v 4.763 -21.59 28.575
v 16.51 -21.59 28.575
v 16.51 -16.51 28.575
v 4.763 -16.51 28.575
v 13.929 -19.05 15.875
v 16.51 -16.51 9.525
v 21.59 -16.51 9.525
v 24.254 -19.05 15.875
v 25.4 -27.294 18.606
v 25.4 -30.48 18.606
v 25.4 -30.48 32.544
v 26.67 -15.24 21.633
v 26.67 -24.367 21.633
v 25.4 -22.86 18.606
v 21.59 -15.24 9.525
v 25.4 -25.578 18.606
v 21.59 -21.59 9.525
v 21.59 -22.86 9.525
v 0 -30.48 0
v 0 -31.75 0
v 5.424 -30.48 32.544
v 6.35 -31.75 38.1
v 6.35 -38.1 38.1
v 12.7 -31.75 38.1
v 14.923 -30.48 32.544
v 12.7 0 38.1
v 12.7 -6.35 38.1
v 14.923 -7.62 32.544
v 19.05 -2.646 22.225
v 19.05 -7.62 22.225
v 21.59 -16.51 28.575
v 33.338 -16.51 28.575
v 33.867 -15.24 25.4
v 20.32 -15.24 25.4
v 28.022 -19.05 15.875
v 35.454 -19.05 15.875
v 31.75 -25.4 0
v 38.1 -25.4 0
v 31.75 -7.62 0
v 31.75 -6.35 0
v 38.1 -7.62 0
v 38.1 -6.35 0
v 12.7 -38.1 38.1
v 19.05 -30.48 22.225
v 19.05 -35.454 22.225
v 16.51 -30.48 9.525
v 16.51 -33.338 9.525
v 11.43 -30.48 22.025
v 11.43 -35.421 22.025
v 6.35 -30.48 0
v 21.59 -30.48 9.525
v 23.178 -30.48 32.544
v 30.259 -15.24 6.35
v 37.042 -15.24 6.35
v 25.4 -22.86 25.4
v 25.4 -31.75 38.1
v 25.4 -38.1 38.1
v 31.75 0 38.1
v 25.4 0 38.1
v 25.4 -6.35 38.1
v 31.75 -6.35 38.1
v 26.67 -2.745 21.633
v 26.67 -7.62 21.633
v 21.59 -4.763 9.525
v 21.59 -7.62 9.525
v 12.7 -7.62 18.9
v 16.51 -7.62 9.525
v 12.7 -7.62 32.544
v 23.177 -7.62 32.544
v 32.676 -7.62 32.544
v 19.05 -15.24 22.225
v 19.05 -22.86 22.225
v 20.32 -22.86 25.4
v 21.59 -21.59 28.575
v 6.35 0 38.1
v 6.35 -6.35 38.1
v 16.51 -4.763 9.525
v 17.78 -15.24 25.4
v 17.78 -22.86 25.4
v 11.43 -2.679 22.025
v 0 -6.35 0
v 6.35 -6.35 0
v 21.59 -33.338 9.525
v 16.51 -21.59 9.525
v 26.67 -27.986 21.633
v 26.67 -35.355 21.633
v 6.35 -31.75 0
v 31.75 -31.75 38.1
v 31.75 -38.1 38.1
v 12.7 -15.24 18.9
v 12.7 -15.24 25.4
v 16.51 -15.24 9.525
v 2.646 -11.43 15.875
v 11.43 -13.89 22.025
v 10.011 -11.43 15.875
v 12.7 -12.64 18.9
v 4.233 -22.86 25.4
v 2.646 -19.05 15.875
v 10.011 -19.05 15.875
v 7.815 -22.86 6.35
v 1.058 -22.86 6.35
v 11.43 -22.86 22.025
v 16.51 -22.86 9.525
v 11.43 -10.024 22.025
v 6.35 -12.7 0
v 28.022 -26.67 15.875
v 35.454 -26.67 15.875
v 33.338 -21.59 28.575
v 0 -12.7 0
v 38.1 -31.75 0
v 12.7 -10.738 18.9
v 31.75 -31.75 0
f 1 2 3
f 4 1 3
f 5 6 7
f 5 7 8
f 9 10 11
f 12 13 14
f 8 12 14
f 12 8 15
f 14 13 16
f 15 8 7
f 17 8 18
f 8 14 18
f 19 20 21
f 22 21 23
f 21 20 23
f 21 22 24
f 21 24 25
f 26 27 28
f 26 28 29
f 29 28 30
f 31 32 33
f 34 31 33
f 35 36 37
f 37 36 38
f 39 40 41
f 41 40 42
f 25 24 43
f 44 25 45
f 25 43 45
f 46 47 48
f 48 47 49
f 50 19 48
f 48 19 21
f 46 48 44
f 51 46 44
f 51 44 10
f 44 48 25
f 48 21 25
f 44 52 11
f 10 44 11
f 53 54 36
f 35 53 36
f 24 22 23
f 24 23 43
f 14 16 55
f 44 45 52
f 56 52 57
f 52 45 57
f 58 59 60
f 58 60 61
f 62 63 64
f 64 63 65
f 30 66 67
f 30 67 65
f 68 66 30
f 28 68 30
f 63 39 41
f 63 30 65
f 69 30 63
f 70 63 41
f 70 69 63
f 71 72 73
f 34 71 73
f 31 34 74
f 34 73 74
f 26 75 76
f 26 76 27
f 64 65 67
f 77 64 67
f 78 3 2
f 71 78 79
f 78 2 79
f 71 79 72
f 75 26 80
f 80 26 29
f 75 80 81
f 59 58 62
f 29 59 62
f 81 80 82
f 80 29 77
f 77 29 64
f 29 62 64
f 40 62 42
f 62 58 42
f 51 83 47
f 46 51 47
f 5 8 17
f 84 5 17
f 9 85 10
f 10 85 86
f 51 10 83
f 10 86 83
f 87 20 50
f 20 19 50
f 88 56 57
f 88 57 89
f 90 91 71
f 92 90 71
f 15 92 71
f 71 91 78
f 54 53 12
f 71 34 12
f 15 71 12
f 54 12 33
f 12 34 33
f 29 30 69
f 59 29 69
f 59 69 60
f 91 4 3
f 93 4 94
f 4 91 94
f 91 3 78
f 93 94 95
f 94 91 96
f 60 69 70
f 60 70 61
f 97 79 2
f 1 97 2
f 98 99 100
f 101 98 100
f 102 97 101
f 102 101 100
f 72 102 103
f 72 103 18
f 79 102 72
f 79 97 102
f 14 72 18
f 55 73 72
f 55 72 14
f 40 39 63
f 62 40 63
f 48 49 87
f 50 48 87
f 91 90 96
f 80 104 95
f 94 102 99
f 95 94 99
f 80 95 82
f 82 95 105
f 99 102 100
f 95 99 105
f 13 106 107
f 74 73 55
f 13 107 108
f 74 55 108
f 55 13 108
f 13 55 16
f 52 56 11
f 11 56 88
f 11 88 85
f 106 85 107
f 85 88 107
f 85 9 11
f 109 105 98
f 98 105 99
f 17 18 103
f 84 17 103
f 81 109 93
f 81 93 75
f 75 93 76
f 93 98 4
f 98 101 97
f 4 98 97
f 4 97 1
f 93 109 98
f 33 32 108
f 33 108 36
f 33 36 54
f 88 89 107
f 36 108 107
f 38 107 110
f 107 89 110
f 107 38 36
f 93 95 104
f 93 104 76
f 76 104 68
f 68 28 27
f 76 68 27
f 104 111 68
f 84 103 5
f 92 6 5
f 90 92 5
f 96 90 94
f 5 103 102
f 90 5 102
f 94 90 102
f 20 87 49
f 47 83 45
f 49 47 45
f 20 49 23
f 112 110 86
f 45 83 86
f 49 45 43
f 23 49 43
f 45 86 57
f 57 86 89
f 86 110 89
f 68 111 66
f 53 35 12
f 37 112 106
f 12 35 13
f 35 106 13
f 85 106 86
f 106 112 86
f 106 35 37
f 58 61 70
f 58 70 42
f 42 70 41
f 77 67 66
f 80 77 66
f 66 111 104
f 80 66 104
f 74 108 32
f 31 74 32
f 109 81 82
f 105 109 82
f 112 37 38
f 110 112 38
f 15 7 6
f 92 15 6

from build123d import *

# Parameters (mm, degrees)
F0_W      = 38.1
F0_H      = 38.1
F1_DEPTH  = 38.1
F6_DEPTH  = 38.1
F8_DEPTH  = 38.1
F9_W      = 25.4
F9_H      = 7.62
F10_DEPTH = 38.1


with BuildPart() as f1:
    # F0 (on Front) → F1 (new body)
    with BuildSketch(Plane.XZ):
        with Locations((19.05, 19.05)):
            Rectangle(F0_W, F0_H)
    extrude(amount=F1_DEPTH)

    # F5 (on offset) → F6 (cut)
    with BuildSketch(Plane.YZ.offset(38.1)):
        Polygon((-11.43, 15.875), (-6.35, 38.1), (-31.75, 38.1), (-26.67, 15.875), (-21.59, 28.575), (-16.51, 28.575), align=None)
        Polygon((-38.1, 0), (-31.75, 0), (-38.1, 38.1), align=None)
        Polygon((-25.4, 0), (-12.7, 0), (-19.05, 15.875), align=None)
        Polygon((-6.35, 0), (0, 0), (0, 38.1), align=None)
    extrude(amount=-F6_DEPTH, mode=Mode.SUBTRACT)

    # F7 (on offset) → F8 (cut)
    with BuildSketch(Plane.XZ.offset(38.1)):
        Polygon((0, 38.1), (0, 0), (6.35, 38.1), align=None)
        Polygon((25.4, 38.1), (12.7, 38.1), (19.05, 22.225), align=None)
        Polygon((31.75, 38.1), (38.1, 0), (38.1, 38.1), align=None)
        Polygon((11.43, 22.025449), (6.35, 0), (31.75, 0), (26.67, 21.632593), (21.59, 9.525), (16.51, 9.525), align=None)
    extrude(amount=-F8_DEPTH, mode=Mode.SUBTRACT)

    # F9 (on offset) → F10 (cut)
    with BuildSketch(Plane.XY.offset(38.1)):
        with Locations((25.4, -11.43)):
            Rectangle(F9_W, F9_H)
        with Locations((12.7, -26.67)):
            Rectangle(F9_W, F9_H)
    extrude(amount=-F10_DEPTH, mode=Mode.SUBTRACT)


solid = f1.part
